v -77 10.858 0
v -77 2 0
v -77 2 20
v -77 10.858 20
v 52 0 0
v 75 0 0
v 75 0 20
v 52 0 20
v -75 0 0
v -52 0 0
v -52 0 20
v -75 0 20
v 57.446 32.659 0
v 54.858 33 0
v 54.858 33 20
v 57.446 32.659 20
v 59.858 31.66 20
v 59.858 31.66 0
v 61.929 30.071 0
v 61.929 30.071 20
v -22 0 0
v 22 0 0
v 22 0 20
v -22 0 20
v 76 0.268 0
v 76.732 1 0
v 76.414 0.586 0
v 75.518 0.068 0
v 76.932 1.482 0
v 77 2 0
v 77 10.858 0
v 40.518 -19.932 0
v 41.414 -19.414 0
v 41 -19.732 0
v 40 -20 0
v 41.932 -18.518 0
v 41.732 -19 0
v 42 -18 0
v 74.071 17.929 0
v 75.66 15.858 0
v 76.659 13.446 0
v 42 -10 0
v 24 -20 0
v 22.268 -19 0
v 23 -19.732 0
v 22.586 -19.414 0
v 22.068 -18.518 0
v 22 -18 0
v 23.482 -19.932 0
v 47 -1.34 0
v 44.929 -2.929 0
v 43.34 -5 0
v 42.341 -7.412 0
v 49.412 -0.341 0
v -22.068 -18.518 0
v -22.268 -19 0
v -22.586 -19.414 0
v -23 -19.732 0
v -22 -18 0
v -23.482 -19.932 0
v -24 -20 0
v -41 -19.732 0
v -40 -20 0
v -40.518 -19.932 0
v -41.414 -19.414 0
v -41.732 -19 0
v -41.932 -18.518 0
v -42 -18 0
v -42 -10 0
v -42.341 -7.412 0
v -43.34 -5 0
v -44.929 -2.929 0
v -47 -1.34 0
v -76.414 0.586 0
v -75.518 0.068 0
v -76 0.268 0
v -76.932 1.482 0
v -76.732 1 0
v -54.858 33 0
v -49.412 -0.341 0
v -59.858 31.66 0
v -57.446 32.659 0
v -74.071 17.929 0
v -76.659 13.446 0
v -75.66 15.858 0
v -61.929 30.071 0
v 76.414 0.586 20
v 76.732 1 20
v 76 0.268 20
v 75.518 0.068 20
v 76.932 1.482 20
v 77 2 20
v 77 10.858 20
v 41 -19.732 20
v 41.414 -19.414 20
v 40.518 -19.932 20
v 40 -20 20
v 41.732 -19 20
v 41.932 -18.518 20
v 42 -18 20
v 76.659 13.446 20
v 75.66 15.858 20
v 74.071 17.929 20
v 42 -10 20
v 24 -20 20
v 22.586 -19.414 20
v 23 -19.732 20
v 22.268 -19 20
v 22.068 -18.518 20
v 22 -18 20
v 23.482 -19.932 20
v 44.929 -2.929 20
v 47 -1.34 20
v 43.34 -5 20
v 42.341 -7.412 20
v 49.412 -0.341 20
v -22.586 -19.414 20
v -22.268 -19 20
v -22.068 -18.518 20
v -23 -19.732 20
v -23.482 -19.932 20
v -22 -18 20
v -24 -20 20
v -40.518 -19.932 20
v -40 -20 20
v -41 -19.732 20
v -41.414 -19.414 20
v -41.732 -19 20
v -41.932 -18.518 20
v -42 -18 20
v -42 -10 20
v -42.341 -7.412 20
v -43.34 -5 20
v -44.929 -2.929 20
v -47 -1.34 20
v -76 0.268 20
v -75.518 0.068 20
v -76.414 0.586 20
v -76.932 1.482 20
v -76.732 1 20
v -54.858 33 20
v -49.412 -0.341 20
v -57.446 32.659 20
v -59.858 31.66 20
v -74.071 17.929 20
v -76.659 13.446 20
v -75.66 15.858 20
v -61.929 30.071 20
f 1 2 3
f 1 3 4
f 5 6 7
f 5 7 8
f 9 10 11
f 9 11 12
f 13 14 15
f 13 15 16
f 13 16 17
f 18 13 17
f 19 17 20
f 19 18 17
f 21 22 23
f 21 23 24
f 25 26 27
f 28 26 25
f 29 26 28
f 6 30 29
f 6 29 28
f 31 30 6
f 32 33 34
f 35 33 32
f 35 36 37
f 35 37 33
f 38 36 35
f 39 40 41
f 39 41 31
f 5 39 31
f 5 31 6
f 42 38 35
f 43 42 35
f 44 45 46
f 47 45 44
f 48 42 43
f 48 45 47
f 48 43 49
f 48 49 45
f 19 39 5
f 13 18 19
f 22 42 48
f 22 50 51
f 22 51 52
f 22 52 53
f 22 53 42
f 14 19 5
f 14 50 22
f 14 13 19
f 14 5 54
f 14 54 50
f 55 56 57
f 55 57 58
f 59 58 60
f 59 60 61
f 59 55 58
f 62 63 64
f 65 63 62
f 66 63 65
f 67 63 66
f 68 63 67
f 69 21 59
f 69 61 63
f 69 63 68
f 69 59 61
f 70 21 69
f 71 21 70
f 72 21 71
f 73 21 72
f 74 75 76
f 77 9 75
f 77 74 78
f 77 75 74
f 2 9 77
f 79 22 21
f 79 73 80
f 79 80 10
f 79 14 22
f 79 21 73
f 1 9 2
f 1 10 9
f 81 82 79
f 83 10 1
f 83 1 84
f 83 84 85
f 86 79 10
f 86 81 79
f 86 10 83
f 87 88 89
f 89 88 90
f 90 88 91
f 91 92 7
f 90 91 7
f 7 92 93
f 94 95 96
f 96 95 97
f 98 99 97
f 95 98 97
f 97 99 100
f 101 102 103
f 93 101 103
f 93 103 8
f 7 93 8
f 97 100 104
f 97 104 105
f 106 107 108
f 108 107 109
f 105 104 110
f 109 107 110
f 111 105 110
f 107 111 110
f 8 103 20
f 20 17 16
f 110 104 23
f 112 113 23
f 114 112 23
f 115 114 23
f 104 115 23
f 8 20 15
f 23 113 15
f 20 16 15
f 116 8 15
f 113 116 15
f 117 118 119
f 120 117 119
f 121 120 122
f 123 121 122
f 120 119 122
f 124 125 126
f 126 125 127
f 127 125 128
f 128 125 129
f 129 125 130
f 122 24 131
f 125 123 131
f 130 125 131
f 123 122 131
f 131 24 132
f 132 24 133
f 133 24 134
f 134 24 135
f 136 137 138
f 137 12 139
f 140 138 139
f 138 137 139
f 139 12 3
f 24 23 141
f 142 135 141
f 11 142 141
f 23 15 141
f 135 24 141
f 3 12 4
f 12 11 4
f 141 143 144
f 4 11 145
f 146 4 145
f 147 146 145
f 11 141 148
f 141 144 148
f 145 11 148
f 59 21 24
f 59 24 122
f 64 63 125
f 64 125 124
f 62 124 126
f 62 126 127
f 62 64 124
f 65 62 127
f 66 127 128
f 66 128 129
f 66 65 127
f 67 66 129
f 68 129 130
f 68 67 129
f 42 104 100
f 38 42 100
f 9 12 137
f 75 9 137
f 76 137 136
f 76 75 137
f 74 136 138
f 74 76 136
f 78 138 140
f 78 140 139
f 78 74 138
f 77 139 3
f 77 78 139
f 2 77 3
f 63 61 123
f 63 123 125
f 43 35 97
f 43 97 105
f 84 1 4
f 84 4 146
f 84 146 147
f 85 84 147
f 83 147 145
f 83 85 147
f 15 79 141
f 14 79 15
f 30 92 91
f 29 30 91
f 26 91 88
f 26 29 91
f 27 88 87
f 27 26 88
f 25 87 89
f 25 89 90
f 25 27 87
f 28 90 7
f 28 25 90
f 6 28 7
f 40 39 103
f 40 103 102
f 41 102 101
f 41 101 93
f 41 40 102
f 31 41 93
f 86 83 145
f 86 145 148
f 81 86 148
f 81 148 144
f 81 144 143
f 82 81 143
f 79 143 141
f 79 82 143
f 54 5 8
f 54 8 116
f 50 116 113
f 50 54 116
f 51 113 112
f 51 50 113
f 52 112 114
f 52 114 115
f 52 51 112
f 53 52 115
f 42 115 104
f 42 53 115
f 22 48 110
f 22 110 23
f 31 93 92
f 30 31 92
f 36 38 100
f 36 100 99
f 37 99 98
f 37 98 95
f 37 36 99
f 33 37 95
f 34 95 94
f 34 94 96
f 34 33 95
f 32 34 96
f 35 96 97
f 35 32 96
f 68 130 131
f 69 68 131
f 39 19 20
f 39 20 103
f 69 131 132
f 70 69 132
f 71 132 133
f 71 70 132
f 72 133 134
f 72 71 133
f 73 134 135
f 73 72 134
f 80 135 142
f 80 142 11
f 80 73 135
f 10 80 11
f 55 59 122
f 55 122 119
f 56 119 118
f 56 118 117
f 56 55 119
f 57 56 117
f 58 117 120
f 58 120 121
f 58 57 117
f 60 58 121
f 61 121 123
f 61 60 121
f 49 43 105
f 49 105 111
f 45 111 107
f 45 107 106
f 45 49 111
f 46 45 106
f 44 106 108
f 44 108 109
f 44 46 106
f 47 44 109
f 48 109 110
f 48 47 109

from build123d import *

# Parameters (mm, degrees)
BOSS_EXTRUDE1_DEPTH = 20


with BuildPart() as part:
    # Sketch1 → Boss-Extrude1 (new body)
    with BuildSketch(Plane.XY):
        with BuildLine():
            Line((22, 0), (-22, 0))
            Line((-22, 0), (-22, -18))
            ThreePointArc((-22, -18), (-22.585786438, -19.414213562), (-24, -20))
            Line((-24, -20), (-40, -20))
            ThreePointArc((-40, -20), (-41.414213562, -19.414213562), (-42, -18))
            Line((-42, -18), (-42, -10))
            ThreePointArc((-42, -10), (-44.928932188, -2.928932188), (-52, 0))
            Line((-52, 0), (-75, 0))
            ThreePointArc((-75, 0), (-76.414213562, 0.585786438), (-77, 2))
            Line((-77, 2), (-77, 10.857864376))
            ThreePointArc((-77, 10.857864376), (-76.238795325, 14.6846987), (-74.071067812, 17.928932188))
            Line((-74.071067812, 17.928932188), (-61.928932188, 30.071067812))
            ThreePointArc((-61.928932188, 30.071067812), (-58.6846987, 32.238795325), (-54.857864376, 33))
            Line((-54.857864376, 33), (54.857864376, 33))
            ThreePointArc((54.857864376, 33), (58.6846987, 32.238795325), (61.928932188, 30.071067812))
            Line((61.928932188, 30.071067812), (74.071067812, 17.928932188))
            ThreePointArc((74.071067812, 17.928932188), (76.238795325, 14.6846987), (77, 10.857864376))
            Line((77, 10.857864376), (77, 2))
            ThreePointArc((77, 2), (76.414213562, 0.585786438), (75, 0))
            Line((75, 0), (52, 0))
            ThreePointArc((52, 0), (44.928932188, -2.928932188), (42, -10))
            Line((42, -10), (42, -18))
            ThreePointArc((42, -18), (41.414213562, -19.414213562), (40, -20))
            Line((40, -20), (24, -20))
            ThreePointArc((24, -20), (22.585786438, -19.414213562), (22, -18))
            Line((22, -18), (22, 0))
        make_face()
    extrude(amount=BOSS_EXTRUDE1_DEPTH)


solid = part.part
